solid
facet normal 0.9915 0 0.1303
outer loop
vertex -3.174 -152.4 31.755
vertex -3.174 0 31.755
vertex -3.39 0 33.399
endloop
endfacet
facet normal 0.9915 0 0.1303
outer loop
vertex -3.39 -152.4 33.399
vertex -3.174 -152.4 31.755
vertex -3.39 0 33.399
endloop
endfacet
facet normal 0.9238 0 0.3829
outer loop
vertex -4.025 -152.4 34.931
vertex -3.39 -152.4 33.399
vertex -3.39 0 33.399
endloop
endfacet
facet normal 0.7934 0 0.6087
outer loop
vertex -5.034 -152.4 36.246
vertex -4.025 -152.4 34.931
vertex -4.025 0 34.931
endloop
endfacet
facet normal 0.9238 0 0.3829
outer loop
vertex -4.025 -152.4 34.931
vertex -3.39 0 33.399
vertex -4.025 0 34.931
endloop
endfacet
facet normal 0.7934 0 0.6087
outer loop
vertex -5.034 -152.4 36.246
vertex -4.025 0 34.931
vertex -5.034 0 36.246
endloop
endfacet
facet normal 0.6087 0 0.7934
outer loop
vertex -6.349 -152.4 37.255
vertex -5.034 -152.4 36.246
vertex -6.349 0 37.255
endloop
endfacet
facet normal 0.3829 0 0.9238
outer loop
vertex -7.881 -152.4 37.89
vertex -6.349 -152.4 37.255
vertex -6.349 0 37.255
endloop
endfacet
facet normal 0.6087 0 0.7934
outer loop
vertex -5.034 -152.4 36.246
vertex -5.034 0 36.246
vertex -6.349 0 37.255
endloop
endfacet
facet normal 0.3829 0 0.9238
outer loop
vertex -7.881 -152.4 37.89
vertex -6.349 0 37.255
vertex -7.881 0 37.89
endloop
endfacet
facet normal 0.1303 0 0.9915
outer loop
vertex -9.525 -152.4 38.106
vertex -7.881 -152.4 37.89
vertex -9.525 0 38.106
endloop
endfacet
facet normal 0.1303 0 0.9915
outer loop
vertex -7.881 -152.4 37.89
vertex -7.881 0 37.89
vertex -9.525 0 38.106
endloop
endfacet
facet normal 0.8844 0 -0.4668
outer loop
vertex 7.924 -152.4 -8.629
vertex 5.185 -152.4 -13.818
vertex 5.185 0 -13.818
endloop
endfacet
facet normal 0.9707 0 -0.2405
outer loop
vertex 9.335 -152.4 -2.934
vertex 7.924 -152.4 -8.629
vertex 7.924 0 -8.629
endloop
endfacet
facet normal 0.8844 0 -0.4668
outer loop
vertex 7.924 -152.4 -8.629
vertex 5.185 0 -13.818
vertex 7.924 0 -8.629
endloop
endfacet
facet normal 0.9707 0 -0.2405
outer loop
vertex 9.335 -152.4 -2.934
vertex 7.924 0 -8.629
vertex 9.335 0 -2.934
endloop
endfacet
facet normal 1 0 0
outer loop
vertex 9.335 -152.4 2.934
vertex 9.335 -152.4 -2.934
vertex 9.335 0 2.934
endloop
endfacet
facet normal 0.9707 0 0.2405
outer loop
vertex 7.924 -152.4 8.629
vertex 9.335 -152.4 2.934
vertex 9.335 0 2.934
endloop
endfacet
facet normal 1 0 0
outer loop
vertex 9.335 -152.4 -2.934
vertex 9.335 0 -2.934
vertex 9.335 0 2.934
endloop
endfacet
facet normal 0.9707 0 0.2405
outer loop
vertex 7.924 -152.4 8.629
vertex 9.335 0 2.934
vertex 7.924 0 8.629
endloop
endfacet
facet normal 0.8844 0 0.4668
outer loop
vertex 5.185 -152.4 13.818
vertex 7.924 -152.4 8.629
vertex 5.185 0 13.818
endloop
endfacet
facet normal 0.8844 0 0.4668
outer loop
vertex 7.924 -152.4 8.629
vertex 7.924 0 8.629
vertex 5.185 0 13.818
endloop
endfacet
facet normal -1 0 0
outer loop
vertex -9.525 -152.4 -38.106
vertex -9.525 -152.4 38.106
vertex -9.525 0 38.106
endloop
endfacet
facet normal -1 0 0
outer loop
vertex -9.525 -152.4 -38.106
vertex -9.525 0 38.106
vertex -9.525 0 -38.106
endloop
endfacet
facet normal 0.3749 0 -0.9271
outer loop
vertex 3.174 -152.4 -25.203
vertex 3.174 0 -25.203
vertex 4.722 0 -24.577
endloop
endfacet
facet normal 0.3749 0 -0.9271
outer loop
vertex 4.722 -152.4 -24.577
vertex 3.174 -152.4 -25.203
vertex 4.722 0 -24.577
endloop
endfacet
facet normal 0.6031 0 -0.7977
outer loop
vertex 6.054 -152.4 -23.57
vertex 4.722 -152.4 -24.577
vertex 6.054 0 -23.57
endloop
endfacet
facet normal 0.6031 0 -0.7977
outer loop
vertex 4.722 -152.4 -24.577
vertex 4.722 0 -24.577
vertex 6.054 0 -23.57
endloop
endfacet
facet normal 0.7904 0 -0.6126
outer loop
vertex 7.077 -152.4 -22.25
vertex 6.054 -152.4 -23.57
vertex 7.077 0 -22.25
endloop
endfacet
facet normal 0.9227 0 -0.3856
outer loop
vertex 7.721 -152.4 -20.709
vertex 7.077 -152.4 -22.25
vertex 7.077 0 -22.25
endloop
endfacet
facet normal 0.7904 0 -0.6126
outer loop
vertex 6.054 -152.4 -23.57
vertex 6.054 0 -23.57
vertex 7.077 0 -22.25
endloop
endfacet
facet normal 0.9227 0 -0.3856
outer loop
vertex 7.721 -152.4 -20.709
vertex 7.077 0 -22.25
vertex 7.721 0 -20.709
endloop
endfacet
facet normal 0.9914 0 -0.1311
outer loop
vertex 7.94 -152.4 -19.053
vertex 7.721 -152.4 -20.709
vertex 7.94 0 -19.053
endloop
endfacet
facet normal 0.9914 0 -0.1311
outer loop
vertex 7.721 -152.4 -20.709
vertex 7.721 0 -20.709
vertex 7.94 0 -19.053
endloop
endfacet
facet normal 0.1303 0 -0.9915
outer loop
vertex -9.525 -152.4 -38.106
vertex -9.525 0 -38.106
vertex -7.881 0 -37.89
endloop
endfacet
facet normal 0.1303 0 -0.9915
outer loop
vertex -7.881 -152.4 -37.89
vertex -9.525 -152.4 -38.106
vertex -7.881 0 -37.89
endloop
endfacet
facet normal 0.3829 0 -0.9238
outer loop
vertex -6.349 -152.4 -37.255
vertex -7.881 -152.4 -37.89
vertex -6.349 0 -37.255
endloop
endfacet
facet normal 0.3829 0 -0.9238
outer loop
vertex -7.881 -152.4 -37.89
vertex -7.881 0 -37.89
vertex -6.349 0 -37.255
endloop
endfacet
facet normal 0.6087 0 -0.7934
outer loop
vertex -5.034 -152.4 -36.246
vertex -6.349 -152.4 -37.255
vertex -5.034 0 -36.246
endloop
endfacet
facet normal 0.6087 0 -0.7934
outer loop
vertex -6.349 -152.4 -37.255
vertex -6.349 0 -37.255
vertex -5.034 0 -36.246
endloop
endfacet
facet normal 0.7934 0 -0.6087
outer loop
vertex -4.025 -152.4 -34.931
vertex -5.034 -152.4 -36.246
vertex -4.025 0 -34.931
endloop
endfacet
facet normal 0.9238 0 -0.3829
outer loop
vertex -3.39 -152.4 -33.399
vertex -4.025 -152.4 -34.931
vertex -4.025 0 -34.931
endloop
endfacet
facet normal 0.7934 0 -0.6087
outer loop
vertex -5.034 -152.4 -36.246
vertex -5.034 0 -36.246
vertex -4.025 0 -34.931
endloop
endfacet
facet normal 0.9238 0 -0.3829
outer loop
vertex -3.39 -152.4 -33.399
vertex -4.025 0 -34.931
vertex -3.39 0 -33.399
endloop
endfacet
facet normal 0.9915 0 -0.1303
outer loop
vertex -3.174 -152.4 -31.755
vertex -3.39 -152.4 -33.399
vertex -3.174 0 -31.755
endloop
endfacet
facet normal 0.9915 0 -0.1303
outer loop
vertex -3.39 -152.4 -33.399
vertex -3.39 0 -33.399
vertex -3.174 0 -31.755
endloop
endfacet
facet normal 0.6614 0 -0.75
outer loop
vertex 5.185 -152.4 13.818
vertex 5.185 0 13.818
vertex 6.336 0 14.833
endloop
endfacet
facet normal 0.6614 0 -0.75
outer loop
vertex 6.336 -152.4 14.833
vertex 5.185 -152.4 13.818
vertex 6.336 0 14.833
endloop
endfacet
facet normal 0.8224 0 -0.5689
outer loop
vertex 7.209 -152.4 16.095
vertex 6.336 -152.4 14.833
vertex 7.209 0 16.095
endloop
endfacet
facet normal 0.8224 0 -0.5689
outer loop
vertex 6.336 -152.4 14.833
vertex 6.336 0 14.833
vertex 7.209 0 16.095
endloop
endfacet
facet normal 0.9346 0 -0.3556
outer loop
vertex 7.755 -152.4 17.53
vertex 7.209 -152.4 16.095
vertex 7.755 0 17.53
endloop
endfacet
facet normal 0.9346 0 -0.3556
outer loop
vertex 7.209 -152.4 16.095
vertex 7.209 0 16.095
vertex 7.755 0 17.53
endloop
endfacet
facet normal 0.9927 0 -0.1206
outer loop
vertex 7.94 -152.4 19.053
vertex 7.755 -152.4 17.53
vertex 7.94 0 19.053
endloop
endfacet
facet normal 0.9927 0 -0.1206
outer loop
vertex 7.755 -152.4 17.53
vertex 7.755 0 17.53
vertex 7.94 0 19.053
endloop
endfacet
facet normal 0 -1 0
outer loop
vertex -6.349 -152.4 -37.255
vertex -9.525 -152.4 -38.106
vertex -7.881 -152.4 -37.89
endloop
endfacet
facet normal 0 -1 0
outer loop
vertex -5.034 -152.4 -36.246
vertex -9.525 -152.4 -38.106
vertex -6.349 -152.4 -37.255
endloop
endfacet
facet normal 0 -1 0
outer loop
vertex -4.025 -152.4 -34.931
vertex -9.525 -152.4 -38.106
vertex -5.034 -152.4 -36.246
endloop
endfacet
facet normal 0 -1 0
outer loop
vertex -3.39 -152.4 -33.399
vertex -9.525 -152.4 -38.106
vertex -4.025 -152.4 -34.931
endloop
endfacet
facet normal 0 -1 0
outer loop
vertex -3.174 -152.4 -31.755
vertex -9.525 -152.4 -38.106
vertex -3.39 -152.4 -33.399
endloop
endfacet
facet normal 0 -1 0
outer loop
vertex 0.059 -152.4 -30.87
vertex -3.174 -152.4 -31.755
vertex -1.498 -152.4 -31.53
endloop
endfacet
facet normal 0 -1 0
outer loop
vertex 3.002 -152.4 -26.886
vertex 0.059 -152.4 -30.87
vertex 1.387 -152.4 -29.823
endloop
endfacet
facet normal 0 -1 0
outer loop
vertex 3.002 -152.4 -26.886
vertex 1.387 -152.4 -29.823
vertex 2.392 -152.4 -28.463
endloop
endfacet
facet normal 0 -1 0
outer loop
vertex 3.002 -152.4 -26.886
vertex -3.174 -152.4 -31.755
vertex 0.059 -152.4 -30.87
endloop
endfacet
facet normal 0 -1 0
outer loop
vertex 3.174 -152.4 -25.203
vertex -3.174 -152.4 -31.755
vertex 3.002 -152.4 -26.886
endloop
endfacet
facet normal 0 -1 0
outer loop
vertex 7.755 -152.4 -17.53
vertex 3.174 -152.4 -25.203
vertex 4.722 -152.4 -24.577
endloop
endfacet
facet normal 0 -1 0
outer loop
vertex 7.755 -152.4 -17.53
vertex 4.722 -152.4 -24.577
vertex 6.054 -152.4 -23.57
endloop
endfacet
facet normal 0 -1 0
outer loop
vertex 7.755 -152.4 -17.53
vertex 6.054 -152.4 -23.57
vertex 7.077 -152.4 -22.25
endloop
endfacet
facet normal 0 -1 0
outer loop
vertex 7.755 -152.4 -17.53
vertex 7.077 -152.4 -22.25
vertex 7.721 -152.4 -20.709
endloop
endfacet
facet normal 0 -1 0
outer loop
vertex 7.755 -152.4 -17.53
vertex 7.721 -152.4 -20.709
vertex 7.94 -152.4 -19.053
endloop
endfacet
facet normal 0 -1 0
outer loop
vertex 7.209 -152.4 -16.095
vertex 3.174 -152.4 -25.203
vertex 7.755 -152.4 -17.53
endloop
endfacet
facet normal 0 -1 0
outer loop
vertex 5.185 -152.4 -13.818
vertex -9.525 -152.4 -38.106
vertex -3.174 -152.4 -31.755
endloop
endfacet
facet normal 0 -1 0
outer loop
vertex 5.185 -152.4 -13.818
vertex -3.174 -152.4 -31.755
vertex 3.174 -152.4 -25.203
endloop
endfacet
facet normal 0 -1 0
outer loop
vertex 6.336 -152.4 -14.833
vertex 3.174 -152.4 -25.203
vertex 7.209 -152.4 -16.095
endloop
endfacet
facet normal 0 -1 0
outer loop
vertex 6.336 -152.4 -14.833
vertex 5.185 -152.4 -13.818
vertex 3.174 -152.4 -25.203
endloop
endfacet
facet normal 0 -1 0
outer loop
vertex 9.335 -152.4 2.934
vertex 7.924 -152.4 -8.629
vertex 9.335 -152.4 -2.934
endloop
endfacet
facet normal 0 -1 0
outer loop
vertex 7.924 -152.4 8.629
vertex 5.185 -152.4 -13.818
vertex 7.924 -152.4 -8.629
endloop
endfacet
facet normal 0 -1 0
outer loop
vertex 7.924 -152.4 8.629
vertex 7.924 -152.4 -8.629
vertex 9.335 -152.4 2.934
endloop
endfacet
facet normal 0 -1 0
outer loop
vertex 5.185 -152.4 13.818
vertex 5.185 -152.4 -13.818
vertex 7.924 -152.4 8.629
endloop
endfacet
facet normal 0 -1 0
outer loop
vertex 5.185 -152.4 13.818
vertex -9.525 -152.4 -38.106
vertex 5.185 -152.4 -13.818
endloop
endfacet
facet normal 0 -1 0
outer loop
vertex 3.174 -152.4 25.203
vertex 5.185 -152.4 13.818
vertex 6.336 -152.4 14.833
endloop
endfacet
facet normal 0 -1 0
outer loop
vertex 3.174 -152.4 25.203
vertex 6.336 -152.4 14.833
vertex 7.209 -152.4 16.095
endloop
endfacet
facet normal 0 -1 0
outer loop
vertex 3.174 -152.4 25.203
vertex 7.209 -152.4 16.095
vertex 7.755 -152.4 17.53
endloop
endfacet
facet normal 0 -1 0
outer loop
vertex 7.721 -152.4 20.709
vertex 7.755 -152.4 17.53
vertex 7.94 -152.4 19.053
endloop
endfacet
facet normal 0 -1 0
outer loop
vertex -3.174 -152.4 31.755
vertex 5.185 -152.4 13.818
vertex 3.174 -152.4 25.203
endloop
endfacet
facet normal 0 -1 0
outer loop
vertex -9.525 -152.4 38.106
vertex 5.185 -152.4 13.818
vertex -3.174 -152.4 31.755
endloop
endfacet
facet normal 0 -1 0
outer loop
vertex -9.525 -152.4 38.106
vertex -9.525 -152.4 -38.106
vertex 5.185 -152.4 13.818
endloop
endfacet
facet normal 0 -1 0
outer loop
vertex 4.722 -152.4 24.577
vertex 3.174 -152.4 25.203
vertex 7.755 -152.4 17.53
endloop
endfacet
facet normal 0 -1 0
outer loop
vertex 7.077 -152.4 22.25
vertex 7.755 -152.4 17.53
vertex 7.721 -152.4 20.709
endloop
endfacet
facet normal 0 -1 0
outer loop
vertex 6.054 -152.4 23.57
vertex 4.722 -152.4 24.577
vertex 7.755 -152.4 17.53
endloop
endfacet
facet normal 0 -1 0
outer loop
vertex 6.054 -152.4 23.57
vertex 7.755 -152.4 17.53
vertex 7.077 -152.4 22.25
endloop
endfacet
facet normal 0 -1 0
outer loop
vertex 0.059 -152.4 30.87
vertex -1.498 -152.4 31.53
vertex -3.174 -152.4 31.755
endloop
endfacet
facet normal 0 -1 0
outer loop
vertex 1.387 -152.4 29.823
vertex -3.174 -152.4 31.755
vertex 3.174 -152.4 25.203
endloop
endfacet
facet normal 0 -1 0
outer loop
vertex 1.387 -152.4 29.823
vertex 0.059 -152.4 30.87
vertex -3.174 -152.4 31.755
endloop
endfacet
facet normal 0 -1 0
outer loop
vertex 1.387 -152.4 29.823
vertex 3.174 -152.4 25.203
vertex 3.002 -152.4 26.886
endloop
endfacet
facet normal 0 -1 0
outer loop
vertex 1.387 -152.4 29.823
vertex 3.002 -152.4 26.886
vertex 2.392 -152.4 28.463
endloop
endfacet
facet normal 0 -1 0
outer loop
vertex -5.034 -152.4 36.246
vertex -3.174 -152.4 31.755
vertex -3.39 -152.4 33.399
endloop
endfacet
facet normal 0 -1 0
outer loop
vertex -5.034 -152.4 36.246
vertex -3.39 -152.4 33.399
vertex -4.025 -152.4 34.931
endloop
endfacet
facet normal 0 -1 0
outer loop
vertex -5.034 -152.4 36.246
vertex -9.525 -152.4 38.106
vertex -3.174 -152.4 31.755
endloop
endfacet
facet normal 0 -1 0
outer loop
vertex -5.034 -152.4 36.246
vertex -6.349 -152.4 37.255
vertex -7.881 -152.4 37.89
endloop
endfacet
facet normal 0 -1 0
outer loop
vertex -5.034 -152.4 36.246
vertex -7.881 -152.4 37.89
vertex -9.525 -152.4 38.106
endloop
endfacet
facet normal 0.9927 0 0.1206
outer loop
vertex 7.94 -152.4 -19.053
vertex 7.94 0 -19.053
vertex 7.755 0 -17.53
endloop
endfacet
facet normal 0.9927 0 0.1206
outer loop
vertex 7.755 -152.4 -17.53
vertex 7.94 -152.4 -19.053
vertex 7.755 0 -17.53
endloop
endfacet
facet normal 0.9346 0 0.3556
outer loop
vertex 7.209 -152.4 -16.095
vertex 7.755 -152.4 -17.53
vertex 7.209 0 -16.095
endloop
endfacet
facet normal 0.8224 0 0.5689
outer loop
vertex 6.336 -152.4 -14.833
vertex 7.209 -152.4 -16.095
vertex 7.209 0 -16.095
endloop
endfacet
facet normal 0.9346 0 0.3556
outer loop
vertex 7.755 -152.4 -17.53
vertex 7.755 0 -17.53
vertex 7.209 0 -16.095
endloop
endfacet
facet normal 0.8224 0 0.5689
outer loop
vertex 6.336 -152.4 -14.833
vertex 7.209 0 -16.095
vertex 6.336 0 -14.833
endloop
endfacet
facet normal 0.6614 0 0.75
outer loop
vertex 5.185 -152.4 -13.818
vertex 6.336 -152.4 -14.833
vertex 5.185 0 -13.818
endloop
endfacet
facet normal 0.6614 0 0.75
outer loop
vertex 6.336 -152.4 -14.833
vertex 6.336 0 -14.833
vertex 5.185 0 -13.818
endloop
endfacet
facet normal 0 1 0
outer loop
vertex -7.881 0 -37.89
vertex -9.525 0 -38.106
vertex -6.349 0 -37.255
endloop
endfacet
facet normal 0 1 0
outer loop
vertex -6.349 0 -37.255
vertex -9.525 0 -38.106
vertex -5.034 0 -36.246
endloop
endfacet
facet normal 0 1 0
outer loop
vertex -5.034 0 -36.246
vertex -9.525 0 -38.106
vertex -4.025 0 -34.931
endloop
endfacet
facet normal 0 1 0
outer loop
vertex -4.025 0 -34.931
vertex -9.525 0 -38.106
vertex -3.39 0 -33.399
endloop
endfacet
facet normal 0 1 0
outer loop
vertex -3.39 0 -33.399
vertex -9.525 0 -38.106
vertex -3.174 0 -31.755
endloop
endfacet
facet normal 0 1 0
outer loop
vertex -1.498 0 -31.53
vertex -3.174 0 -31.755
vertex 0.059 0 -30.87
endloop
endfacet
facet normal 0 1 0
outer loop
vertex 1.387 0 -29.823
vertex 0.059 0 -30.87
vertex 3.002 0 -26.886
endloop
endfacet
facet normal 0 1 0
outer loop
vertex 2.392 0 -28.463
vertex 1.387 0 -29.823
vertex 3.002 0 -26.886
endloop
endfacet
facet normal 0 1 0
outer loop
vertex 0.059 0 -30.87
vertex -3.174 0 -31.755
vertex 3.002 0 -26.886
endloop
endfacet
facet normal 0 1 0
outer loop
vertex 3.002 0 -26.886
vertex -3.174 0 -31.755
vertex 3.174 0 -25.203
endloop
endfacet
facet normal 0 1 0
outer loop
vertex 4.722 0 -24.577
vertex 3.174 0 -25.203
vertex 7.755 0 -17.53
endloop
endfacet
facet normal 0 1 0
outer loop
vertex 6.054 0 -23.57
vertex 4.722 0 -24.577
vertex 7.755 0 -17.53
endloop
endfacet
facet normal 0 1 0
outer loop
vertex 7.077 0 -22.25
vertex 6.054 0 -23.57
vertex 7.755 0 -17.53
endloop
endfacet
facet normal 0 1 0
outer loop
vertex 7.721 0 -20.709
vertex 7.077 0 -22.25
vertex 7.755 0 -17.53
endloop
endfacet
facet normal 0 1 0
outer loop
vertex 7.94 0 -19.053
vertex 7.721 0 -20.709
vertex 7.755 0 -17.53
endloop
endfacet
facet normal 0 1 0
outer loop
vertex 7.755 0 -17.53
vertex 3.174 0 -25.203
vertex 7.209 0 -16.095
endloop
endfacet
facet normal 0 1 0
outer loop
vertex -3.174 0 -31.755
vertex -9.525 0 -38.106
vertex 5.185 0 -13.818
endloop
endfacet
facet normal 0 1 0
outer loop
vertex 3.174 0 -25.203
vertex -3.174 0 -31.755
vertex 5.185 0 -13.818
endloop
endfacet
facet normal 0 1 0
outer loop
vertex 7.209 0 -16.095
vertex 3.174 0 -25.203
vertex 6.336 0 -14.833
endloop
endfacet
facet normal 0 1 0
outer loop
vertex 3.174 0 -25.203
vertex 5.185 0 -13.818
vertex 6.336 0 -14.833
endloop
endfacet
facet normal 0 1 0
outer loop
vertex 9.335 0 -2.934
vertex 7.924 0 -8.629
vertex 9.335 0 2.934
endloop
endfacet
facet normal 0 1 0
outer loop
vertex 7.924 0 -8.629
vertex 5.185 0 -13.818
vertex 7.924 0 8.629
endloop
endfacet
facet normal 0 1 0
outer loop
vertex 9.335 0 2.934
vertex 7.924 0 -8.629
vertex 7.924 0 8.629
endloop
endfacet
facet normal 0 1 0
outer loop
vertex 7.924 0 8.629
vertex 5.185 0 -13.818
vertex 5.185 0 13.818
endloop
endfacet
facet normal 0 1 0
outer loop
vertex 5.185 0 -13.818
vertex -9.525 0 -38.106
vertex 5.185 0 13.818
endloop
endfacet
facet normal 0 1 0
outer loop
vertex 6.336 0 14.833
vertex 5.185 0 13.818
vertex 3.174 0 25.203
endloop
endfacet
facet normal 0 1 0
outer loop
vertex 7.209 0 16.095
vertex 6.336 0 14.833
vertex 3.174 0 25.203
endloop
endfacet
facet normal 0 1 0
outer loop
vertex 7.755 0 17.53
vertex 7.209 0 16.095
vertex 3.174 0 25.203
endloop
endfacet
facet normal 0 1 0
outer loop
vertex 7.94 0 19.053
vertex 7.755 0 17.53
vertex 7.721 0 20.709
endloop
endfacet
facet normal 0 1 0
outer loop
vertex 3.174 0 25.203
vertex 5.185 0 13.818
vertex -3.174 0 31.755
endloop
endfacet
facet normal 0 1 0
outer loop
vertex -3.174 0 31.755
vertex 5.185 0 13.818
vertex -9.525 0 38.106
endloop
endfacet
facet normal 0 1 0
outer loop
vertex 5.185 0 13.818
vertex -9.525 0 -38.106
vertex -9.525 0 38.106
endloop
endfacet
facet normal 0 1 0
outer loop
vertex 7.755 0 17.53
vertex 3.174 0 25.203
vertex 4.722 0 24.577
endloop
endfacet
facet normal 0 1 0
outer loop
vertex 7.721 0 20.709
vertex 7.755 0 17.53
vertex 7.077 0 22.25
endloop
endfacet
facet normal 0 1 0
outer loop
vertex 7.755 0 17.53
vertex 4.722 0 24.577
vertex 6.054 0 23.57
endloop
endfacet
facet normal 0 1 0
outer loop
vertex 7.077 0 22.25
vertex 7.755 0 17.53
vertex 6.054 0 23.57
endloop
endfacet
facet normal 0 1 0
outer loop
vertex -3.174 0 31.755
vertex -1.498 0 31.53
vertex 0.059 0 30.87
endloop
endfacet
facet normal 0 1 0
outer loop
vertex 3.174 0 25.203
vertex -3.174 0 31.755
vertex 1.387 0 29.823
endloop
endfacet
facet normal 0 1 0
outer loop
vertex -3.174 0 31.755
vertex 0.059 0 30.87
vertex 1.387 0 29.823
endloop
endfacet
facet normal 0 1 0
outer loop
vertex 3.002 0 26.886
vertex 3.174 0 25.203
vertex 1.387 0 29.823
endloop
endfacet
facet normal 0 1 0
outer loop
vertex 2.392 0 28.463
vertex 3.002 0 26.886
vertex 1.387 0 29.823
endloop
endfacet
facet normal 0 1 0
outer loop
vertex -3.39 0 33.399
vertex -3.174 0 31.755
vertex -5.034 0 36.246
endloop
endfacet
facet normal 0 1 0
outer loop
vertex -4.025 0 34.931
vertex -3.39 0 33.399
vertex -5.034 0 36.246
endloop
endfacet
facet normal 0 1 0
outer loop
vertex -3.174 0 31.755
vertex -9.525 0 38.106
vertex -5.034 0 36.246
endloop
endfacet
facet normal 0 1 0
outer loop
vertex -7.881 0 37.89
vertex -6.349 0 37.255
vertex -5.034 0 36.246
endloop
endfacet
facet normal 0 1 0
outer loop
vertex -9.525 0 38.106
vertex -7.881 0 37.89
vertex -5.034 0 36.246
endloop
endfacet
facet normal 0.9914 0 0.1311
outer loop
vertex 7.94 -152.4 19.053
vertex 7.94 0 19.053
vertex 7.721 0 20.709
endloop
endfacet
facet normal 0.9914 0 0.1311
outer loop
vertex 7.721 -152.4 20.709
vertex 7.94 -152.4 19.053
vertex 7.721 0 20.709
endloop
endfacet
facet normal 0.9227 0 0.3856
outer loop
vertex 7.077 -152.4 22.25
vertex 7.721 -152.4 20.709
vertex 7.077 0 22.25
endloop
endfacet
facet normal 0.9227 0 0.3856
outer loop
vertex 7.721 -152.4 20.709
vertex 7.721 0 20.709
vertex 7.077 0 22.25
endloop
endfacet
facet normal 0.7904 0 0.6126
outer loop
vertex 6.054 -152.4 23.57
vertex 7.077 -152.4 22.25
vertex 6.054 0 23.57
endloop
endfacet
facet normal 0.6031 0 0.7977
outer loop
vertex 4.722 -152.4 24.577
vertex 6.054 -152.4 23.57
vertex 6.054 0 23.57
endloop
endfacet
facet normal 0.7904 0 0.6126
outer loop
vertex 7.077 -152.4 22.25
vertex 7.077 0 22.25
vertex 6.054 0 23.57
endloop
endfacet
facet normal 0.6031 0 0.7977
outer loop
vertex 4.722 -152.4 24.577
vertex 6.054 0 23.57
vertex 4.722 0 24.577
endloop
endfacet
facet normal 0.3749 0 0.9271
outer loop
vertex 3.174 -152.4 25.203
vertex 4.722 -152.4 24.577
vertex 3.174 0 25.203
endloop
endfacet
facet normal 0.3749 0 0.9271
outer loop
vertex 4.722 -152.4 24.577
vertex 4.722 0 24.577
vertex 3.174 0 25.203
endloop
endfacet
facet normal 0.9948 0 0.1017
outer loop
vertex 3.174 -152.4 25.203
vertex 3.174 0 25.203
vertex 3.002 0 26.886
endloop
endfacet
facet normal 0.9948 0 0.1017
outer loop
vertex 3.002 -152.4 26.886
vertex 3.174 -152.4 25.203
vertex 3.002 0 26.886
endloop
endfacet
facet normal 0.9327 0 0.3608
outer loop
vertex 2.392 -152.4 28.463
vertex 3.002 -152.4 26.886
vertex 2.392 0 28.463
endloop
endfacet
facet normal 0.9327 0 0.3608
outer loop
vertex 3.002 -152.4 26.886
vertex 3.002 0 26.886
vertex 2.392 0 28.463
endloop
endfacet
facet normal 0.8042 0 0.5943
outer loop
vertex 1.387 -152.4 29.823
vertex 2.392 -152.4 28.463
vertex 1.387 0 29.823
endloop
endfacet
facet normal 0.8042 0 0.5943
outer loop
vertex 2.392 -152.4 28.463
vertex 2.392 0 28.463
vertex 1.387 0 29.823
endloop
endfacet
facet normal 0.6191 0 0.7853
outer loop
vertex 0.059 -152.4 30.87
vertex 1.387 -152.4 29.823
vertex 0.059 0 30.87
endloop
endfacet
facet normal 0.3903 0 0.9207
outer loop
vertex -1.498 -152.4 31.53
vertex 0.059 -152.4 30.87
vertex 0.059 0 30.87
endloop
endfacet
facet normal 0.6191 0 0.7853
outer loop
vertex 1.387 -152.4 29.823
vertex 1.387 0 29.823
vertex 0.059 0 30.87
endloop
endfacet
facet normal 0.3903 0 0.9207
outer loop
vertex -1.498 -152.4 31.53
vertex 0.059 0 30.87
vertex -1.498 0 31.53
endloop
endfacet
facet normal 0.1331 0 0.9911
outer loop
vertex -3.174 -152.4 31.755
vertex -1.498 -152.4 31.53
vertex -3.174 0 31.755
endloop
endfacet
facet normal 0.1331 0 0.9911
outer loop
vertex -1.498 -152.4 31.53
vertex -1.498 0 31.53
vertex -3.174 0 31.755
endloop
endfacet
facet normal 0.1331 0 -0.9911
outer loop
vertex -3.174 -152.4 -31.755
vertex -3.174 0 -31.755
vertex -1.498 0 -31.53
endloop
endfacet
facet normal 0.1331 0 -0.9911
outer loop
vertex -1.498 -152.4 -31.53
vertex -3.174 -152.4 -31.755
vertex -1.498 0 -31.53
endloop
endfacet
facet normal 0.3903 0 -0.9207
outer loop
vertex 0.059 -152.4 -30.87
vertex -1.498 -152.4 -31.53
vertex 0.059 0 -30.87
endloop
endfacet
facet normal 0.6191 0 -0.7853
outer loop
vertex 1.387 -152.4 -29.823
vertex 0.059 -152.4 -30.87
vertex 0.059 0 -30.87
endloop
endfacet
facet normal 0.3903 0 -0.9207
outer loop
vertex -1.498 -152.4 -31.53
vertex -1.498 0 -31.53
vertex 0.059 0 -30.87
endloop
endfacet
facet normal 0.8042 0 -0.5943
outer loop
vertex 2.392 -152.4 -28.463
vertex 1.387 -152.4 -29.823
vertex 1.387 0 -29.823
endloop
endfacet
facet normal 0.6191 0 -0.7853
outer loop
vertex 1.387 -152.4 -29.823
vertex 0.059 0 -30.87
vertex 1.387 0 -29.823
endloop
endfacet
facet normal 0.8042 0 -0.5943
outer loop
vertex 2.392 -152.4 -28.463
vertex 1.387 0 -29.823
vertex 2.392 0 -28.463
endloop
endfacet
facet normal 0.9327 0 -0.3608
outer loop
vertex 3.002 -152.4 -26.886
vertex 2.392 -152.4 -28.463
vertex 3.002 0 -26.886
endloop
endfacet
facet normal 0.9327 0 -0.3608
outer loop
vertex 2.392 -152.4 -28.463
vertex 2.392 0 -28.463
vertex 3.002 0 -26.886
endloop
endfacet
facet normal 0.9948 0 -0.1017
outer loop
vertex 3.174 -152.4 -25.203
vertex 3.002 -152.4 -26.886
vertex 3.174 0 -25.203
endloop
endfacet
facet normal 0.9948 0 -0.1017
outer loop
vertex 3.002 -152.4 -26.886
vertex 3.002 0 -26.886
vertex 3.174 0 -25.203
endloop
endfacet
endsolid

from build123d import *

# Parameters (mm, degrees)
F1_DEPTH = 152.4


# Not quite as in the source:
# - ends of sketch curves that miss each other by under 0.0002 mm in the source are joined


with BuildPart() as f1:
    # F0 (on Front) → F1 (new body)
    with BuildSketch(Plane.XZ):
        with BuildLine():
            ThreePointArc((-3.173984, 31.7550292), (-5.034153519, 36.245875681), (-9.525, 38.1060452))
            Line((-9.525, 38.1060452), (-9.525, -38.1060452))
            ThreePointArc((-9.525, -38.1060452), (-5.034153519, -36.245875681), (-3.173984, -31.7550292))
            ThreePointArc((-3.173984, -31.7550292), (1.3873070975, -29.8232975079), (3.1738358164, -25.2031917651))
            ThreePointArc((3.1738358164, -25.2031917651), (6.6091861803, -22.9435143548), (7.940294, -19.0530226))
            ThreePointArc((7.940294, -19.0530226), (7.2093686546, -16.094985199), (5.1848340025, -13.817816657))
            ThreePointArc((5.1848340025, -13.817816657), (9.5132844595, -8.141e-06), (5.1848116567, 13.8177933751))
            ThreePointArc((5.1848116567, 13.8177933751), (7.2093653059, 16.0949788365), (7.940294, 19.0530226))
            ThreePointArc((7.940294, 19.0530226), (6.6091861803, 22.9435143548), (3.1738358164, 25.2031917651))
            ThreePointArc((3.1738358164, 25.2031917651), (1.3873169736, 29.8232821056), (-3.173984, 31.7550292))
        make_face()
    extrude(amount=F1_DEPTH)


solid = f1.part
